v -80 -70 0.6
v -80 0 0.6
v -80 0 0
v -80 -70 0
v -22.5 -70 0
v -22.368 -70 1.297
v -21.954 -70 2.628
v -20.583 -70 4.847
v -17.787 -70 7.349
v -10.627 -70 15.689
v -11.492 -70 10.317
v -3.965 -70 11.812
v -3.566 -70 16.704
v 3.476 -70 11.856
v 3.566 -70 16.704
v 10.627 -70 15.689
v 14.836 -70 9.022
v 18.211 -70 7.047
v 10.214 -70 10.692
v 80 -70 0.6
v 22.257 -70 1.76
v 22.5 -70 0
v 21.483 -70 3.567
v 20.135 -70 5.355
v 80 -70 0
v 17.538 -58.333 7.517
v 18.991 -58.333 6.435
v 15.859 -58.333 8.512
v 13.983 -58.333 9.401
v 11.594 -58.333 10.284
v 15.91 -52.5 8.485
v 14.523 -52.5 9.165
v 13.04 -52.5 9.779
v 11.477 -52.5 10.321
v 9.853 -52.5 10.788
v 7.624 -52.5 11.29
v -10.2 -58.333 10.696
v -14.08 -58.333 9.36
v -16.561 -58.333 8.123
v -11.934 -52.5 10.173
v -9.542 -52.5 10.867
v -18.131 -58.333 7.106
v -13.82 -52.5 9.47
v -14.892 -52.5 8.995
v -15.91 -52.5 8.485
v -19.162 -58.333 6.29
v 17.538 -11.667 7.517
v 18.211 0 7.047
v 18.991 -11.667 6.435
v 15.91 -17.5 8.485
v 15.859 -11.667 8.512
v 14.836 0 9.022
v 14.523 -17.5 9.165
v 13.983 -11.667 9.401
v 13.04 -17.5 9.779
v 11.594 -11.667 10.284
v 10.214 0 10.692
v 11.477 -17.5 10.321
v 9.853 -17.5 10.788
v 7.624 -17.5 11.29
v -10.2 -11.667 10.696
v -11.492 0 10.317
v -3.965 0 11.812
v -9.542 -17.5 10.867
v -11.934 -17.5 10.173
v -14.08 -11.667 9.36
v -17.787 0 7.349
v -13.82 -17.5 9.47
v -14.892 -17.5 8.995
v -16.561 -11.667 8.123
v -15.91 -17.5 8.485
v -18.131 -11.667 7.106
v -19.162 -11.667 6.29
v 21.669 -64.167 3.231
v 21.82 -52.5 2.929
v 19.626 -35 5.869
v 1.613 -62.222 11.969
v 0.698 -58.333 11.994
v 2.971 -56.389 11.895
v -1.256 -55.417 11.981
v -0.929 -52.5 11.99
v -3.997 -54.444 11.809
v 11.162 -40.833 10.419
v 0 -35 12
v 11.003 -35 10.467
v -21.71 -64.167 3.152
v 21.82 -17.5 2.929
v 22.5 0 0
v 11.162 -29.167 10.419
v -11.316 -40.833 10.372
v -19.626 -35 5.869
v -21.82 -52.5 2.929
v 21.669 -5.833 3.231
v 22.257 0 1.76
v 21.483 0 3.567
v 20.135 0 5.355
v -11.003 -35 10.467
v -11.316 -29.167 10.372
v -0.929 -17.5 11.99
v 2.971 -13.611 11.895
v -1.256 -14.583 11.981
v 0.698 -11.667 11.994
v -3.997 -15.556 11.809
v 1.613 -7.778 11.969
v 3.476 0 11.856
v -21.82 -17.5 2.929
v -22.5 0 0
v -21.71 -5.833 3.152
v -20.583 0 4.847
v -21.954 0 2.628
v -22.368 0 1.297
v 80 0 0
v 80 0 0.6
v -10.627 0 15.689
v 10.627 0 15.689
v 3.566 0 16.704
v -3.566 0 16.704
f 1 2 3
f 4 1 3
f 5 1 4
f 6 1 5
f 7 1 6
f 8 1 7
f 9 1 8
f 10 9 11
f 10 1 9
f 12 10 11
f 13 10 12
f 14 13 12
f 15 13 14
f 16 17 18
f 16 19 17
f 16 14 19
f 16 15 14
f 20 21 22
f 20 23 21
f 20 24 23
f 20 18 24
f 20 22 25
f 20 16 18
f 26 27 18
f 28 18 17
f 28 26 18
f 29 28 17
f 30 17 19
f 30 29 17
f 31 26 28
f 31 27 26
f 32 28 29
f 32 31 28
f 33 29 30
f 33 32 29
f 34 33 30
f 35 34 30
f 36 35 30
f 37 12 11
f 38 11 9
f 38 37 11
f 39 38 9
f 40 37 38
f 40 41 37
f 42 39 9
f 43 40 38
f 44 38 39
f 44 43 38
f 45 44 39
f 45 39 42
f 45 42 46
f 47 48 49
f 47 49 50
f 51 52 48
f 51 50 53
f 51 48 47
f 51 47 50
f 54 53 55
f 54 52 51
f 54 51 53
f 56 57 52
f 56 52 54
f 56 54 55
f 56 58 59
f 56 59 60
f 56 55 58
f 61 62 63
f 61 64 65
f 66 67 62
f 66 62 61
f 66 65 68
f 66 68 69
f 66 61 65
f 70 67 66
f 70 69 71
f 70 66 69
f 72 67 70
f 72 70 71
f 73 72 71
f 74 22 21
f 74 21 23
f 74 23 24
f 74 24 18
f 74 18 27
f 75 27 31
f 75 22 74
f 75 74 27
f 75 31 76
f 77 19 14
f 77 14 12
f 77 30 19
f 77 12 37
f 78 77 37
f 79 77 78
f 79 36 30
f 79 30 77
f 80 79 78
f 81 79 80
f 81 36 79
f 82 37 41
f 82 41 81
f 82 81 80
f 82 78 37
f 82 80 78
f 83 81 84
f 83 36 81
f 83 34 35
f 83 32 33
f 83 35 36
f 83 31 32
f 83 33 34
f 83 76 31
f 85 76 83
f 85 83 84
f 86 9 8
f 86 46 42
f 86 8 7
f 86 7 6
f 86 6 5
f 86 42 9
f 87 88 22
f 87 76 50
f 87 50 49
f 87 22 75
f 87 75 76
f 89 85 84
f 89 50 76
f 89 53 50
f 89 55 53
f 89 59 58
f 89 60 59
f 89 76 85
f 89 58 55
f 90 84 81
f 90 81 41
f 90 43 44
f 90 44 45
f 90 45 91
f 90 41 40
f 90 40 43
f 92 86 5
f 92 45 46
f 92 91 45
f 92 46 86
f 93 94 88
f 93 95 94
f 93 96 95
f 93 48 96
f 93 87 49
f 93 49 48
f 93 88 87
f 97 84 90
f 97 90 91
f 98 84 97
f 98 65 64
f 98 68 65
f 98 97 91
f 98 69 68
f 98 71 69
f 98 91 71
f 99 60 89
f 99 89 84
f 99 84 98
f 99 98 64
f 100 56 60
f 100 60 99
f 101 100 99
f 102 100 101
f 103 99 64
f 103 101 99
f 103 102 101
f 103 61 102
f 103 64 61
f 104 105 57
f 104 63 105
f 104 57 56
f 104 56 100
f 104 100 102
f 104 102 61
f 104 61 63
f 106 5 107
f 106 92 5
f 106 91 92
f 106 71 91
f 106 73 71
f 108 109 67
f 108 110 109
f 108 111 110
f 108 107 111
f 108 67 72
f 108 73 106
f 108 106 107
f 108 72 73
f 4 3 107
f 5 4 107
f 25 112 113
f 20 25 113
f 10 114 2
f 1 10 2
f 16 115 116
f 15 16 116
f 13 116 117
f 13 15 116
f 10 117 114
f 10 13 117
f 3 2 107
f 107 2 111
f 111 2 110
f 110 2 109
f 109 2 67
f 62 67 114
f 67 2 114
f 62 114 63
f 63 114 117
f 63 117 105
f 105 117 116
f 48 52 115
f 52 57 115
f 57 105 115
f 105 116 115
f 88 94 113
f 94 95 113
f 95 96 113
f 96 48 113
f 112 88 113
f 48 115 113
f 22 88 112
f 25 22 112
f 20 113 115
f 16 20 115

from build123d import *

# Parameters (mm, degrees)
F1_DEPTH = 70
F2_R     = 50


with BuildPart() as f1:
    # F0 (on Front) → F1 (new body)
    with BuildSketch(Plane.XZ):
        with BuildLine():
            Line((-80, 0.6), (-80, 0))
            Line((-80, 0), (-22.5, 0))
            add(Edge.make_bspline(
                [(0, 12), (-22.5, 12), (-22.5, 0)],
                knots=[4.712389, 4.712389, 4.712389, 6.283185, 6.283185, 6.283185], degree=2, weights=[1, 0.707107, 1]))
            add(Edge.make_bspline(
                [(22.5, 0), (22.5, 12), (0, 12)],
                knots=[3.141593, 3.141593, 3.141593, 4.712389, 4.712389, 4.712389], degree=2, weights=[1, 0.707107, 1]))
            Line((22.5, 0), (80, 0))
            Line((80, 0), (80, 0.6))
            Line((80, 0.6), (0, 18))
            Line((0, 18), (-80, 0.6))
        make_face()
    extrude(amount=F1_DEPTH)

    # F2
    f2_edges = [f1.edges().sort_by_distance(p)[0] for p in [
        (0, -35, 18),
    ]]
    fillet(f2_edges, radius=F2_R)


solid = f1.part
